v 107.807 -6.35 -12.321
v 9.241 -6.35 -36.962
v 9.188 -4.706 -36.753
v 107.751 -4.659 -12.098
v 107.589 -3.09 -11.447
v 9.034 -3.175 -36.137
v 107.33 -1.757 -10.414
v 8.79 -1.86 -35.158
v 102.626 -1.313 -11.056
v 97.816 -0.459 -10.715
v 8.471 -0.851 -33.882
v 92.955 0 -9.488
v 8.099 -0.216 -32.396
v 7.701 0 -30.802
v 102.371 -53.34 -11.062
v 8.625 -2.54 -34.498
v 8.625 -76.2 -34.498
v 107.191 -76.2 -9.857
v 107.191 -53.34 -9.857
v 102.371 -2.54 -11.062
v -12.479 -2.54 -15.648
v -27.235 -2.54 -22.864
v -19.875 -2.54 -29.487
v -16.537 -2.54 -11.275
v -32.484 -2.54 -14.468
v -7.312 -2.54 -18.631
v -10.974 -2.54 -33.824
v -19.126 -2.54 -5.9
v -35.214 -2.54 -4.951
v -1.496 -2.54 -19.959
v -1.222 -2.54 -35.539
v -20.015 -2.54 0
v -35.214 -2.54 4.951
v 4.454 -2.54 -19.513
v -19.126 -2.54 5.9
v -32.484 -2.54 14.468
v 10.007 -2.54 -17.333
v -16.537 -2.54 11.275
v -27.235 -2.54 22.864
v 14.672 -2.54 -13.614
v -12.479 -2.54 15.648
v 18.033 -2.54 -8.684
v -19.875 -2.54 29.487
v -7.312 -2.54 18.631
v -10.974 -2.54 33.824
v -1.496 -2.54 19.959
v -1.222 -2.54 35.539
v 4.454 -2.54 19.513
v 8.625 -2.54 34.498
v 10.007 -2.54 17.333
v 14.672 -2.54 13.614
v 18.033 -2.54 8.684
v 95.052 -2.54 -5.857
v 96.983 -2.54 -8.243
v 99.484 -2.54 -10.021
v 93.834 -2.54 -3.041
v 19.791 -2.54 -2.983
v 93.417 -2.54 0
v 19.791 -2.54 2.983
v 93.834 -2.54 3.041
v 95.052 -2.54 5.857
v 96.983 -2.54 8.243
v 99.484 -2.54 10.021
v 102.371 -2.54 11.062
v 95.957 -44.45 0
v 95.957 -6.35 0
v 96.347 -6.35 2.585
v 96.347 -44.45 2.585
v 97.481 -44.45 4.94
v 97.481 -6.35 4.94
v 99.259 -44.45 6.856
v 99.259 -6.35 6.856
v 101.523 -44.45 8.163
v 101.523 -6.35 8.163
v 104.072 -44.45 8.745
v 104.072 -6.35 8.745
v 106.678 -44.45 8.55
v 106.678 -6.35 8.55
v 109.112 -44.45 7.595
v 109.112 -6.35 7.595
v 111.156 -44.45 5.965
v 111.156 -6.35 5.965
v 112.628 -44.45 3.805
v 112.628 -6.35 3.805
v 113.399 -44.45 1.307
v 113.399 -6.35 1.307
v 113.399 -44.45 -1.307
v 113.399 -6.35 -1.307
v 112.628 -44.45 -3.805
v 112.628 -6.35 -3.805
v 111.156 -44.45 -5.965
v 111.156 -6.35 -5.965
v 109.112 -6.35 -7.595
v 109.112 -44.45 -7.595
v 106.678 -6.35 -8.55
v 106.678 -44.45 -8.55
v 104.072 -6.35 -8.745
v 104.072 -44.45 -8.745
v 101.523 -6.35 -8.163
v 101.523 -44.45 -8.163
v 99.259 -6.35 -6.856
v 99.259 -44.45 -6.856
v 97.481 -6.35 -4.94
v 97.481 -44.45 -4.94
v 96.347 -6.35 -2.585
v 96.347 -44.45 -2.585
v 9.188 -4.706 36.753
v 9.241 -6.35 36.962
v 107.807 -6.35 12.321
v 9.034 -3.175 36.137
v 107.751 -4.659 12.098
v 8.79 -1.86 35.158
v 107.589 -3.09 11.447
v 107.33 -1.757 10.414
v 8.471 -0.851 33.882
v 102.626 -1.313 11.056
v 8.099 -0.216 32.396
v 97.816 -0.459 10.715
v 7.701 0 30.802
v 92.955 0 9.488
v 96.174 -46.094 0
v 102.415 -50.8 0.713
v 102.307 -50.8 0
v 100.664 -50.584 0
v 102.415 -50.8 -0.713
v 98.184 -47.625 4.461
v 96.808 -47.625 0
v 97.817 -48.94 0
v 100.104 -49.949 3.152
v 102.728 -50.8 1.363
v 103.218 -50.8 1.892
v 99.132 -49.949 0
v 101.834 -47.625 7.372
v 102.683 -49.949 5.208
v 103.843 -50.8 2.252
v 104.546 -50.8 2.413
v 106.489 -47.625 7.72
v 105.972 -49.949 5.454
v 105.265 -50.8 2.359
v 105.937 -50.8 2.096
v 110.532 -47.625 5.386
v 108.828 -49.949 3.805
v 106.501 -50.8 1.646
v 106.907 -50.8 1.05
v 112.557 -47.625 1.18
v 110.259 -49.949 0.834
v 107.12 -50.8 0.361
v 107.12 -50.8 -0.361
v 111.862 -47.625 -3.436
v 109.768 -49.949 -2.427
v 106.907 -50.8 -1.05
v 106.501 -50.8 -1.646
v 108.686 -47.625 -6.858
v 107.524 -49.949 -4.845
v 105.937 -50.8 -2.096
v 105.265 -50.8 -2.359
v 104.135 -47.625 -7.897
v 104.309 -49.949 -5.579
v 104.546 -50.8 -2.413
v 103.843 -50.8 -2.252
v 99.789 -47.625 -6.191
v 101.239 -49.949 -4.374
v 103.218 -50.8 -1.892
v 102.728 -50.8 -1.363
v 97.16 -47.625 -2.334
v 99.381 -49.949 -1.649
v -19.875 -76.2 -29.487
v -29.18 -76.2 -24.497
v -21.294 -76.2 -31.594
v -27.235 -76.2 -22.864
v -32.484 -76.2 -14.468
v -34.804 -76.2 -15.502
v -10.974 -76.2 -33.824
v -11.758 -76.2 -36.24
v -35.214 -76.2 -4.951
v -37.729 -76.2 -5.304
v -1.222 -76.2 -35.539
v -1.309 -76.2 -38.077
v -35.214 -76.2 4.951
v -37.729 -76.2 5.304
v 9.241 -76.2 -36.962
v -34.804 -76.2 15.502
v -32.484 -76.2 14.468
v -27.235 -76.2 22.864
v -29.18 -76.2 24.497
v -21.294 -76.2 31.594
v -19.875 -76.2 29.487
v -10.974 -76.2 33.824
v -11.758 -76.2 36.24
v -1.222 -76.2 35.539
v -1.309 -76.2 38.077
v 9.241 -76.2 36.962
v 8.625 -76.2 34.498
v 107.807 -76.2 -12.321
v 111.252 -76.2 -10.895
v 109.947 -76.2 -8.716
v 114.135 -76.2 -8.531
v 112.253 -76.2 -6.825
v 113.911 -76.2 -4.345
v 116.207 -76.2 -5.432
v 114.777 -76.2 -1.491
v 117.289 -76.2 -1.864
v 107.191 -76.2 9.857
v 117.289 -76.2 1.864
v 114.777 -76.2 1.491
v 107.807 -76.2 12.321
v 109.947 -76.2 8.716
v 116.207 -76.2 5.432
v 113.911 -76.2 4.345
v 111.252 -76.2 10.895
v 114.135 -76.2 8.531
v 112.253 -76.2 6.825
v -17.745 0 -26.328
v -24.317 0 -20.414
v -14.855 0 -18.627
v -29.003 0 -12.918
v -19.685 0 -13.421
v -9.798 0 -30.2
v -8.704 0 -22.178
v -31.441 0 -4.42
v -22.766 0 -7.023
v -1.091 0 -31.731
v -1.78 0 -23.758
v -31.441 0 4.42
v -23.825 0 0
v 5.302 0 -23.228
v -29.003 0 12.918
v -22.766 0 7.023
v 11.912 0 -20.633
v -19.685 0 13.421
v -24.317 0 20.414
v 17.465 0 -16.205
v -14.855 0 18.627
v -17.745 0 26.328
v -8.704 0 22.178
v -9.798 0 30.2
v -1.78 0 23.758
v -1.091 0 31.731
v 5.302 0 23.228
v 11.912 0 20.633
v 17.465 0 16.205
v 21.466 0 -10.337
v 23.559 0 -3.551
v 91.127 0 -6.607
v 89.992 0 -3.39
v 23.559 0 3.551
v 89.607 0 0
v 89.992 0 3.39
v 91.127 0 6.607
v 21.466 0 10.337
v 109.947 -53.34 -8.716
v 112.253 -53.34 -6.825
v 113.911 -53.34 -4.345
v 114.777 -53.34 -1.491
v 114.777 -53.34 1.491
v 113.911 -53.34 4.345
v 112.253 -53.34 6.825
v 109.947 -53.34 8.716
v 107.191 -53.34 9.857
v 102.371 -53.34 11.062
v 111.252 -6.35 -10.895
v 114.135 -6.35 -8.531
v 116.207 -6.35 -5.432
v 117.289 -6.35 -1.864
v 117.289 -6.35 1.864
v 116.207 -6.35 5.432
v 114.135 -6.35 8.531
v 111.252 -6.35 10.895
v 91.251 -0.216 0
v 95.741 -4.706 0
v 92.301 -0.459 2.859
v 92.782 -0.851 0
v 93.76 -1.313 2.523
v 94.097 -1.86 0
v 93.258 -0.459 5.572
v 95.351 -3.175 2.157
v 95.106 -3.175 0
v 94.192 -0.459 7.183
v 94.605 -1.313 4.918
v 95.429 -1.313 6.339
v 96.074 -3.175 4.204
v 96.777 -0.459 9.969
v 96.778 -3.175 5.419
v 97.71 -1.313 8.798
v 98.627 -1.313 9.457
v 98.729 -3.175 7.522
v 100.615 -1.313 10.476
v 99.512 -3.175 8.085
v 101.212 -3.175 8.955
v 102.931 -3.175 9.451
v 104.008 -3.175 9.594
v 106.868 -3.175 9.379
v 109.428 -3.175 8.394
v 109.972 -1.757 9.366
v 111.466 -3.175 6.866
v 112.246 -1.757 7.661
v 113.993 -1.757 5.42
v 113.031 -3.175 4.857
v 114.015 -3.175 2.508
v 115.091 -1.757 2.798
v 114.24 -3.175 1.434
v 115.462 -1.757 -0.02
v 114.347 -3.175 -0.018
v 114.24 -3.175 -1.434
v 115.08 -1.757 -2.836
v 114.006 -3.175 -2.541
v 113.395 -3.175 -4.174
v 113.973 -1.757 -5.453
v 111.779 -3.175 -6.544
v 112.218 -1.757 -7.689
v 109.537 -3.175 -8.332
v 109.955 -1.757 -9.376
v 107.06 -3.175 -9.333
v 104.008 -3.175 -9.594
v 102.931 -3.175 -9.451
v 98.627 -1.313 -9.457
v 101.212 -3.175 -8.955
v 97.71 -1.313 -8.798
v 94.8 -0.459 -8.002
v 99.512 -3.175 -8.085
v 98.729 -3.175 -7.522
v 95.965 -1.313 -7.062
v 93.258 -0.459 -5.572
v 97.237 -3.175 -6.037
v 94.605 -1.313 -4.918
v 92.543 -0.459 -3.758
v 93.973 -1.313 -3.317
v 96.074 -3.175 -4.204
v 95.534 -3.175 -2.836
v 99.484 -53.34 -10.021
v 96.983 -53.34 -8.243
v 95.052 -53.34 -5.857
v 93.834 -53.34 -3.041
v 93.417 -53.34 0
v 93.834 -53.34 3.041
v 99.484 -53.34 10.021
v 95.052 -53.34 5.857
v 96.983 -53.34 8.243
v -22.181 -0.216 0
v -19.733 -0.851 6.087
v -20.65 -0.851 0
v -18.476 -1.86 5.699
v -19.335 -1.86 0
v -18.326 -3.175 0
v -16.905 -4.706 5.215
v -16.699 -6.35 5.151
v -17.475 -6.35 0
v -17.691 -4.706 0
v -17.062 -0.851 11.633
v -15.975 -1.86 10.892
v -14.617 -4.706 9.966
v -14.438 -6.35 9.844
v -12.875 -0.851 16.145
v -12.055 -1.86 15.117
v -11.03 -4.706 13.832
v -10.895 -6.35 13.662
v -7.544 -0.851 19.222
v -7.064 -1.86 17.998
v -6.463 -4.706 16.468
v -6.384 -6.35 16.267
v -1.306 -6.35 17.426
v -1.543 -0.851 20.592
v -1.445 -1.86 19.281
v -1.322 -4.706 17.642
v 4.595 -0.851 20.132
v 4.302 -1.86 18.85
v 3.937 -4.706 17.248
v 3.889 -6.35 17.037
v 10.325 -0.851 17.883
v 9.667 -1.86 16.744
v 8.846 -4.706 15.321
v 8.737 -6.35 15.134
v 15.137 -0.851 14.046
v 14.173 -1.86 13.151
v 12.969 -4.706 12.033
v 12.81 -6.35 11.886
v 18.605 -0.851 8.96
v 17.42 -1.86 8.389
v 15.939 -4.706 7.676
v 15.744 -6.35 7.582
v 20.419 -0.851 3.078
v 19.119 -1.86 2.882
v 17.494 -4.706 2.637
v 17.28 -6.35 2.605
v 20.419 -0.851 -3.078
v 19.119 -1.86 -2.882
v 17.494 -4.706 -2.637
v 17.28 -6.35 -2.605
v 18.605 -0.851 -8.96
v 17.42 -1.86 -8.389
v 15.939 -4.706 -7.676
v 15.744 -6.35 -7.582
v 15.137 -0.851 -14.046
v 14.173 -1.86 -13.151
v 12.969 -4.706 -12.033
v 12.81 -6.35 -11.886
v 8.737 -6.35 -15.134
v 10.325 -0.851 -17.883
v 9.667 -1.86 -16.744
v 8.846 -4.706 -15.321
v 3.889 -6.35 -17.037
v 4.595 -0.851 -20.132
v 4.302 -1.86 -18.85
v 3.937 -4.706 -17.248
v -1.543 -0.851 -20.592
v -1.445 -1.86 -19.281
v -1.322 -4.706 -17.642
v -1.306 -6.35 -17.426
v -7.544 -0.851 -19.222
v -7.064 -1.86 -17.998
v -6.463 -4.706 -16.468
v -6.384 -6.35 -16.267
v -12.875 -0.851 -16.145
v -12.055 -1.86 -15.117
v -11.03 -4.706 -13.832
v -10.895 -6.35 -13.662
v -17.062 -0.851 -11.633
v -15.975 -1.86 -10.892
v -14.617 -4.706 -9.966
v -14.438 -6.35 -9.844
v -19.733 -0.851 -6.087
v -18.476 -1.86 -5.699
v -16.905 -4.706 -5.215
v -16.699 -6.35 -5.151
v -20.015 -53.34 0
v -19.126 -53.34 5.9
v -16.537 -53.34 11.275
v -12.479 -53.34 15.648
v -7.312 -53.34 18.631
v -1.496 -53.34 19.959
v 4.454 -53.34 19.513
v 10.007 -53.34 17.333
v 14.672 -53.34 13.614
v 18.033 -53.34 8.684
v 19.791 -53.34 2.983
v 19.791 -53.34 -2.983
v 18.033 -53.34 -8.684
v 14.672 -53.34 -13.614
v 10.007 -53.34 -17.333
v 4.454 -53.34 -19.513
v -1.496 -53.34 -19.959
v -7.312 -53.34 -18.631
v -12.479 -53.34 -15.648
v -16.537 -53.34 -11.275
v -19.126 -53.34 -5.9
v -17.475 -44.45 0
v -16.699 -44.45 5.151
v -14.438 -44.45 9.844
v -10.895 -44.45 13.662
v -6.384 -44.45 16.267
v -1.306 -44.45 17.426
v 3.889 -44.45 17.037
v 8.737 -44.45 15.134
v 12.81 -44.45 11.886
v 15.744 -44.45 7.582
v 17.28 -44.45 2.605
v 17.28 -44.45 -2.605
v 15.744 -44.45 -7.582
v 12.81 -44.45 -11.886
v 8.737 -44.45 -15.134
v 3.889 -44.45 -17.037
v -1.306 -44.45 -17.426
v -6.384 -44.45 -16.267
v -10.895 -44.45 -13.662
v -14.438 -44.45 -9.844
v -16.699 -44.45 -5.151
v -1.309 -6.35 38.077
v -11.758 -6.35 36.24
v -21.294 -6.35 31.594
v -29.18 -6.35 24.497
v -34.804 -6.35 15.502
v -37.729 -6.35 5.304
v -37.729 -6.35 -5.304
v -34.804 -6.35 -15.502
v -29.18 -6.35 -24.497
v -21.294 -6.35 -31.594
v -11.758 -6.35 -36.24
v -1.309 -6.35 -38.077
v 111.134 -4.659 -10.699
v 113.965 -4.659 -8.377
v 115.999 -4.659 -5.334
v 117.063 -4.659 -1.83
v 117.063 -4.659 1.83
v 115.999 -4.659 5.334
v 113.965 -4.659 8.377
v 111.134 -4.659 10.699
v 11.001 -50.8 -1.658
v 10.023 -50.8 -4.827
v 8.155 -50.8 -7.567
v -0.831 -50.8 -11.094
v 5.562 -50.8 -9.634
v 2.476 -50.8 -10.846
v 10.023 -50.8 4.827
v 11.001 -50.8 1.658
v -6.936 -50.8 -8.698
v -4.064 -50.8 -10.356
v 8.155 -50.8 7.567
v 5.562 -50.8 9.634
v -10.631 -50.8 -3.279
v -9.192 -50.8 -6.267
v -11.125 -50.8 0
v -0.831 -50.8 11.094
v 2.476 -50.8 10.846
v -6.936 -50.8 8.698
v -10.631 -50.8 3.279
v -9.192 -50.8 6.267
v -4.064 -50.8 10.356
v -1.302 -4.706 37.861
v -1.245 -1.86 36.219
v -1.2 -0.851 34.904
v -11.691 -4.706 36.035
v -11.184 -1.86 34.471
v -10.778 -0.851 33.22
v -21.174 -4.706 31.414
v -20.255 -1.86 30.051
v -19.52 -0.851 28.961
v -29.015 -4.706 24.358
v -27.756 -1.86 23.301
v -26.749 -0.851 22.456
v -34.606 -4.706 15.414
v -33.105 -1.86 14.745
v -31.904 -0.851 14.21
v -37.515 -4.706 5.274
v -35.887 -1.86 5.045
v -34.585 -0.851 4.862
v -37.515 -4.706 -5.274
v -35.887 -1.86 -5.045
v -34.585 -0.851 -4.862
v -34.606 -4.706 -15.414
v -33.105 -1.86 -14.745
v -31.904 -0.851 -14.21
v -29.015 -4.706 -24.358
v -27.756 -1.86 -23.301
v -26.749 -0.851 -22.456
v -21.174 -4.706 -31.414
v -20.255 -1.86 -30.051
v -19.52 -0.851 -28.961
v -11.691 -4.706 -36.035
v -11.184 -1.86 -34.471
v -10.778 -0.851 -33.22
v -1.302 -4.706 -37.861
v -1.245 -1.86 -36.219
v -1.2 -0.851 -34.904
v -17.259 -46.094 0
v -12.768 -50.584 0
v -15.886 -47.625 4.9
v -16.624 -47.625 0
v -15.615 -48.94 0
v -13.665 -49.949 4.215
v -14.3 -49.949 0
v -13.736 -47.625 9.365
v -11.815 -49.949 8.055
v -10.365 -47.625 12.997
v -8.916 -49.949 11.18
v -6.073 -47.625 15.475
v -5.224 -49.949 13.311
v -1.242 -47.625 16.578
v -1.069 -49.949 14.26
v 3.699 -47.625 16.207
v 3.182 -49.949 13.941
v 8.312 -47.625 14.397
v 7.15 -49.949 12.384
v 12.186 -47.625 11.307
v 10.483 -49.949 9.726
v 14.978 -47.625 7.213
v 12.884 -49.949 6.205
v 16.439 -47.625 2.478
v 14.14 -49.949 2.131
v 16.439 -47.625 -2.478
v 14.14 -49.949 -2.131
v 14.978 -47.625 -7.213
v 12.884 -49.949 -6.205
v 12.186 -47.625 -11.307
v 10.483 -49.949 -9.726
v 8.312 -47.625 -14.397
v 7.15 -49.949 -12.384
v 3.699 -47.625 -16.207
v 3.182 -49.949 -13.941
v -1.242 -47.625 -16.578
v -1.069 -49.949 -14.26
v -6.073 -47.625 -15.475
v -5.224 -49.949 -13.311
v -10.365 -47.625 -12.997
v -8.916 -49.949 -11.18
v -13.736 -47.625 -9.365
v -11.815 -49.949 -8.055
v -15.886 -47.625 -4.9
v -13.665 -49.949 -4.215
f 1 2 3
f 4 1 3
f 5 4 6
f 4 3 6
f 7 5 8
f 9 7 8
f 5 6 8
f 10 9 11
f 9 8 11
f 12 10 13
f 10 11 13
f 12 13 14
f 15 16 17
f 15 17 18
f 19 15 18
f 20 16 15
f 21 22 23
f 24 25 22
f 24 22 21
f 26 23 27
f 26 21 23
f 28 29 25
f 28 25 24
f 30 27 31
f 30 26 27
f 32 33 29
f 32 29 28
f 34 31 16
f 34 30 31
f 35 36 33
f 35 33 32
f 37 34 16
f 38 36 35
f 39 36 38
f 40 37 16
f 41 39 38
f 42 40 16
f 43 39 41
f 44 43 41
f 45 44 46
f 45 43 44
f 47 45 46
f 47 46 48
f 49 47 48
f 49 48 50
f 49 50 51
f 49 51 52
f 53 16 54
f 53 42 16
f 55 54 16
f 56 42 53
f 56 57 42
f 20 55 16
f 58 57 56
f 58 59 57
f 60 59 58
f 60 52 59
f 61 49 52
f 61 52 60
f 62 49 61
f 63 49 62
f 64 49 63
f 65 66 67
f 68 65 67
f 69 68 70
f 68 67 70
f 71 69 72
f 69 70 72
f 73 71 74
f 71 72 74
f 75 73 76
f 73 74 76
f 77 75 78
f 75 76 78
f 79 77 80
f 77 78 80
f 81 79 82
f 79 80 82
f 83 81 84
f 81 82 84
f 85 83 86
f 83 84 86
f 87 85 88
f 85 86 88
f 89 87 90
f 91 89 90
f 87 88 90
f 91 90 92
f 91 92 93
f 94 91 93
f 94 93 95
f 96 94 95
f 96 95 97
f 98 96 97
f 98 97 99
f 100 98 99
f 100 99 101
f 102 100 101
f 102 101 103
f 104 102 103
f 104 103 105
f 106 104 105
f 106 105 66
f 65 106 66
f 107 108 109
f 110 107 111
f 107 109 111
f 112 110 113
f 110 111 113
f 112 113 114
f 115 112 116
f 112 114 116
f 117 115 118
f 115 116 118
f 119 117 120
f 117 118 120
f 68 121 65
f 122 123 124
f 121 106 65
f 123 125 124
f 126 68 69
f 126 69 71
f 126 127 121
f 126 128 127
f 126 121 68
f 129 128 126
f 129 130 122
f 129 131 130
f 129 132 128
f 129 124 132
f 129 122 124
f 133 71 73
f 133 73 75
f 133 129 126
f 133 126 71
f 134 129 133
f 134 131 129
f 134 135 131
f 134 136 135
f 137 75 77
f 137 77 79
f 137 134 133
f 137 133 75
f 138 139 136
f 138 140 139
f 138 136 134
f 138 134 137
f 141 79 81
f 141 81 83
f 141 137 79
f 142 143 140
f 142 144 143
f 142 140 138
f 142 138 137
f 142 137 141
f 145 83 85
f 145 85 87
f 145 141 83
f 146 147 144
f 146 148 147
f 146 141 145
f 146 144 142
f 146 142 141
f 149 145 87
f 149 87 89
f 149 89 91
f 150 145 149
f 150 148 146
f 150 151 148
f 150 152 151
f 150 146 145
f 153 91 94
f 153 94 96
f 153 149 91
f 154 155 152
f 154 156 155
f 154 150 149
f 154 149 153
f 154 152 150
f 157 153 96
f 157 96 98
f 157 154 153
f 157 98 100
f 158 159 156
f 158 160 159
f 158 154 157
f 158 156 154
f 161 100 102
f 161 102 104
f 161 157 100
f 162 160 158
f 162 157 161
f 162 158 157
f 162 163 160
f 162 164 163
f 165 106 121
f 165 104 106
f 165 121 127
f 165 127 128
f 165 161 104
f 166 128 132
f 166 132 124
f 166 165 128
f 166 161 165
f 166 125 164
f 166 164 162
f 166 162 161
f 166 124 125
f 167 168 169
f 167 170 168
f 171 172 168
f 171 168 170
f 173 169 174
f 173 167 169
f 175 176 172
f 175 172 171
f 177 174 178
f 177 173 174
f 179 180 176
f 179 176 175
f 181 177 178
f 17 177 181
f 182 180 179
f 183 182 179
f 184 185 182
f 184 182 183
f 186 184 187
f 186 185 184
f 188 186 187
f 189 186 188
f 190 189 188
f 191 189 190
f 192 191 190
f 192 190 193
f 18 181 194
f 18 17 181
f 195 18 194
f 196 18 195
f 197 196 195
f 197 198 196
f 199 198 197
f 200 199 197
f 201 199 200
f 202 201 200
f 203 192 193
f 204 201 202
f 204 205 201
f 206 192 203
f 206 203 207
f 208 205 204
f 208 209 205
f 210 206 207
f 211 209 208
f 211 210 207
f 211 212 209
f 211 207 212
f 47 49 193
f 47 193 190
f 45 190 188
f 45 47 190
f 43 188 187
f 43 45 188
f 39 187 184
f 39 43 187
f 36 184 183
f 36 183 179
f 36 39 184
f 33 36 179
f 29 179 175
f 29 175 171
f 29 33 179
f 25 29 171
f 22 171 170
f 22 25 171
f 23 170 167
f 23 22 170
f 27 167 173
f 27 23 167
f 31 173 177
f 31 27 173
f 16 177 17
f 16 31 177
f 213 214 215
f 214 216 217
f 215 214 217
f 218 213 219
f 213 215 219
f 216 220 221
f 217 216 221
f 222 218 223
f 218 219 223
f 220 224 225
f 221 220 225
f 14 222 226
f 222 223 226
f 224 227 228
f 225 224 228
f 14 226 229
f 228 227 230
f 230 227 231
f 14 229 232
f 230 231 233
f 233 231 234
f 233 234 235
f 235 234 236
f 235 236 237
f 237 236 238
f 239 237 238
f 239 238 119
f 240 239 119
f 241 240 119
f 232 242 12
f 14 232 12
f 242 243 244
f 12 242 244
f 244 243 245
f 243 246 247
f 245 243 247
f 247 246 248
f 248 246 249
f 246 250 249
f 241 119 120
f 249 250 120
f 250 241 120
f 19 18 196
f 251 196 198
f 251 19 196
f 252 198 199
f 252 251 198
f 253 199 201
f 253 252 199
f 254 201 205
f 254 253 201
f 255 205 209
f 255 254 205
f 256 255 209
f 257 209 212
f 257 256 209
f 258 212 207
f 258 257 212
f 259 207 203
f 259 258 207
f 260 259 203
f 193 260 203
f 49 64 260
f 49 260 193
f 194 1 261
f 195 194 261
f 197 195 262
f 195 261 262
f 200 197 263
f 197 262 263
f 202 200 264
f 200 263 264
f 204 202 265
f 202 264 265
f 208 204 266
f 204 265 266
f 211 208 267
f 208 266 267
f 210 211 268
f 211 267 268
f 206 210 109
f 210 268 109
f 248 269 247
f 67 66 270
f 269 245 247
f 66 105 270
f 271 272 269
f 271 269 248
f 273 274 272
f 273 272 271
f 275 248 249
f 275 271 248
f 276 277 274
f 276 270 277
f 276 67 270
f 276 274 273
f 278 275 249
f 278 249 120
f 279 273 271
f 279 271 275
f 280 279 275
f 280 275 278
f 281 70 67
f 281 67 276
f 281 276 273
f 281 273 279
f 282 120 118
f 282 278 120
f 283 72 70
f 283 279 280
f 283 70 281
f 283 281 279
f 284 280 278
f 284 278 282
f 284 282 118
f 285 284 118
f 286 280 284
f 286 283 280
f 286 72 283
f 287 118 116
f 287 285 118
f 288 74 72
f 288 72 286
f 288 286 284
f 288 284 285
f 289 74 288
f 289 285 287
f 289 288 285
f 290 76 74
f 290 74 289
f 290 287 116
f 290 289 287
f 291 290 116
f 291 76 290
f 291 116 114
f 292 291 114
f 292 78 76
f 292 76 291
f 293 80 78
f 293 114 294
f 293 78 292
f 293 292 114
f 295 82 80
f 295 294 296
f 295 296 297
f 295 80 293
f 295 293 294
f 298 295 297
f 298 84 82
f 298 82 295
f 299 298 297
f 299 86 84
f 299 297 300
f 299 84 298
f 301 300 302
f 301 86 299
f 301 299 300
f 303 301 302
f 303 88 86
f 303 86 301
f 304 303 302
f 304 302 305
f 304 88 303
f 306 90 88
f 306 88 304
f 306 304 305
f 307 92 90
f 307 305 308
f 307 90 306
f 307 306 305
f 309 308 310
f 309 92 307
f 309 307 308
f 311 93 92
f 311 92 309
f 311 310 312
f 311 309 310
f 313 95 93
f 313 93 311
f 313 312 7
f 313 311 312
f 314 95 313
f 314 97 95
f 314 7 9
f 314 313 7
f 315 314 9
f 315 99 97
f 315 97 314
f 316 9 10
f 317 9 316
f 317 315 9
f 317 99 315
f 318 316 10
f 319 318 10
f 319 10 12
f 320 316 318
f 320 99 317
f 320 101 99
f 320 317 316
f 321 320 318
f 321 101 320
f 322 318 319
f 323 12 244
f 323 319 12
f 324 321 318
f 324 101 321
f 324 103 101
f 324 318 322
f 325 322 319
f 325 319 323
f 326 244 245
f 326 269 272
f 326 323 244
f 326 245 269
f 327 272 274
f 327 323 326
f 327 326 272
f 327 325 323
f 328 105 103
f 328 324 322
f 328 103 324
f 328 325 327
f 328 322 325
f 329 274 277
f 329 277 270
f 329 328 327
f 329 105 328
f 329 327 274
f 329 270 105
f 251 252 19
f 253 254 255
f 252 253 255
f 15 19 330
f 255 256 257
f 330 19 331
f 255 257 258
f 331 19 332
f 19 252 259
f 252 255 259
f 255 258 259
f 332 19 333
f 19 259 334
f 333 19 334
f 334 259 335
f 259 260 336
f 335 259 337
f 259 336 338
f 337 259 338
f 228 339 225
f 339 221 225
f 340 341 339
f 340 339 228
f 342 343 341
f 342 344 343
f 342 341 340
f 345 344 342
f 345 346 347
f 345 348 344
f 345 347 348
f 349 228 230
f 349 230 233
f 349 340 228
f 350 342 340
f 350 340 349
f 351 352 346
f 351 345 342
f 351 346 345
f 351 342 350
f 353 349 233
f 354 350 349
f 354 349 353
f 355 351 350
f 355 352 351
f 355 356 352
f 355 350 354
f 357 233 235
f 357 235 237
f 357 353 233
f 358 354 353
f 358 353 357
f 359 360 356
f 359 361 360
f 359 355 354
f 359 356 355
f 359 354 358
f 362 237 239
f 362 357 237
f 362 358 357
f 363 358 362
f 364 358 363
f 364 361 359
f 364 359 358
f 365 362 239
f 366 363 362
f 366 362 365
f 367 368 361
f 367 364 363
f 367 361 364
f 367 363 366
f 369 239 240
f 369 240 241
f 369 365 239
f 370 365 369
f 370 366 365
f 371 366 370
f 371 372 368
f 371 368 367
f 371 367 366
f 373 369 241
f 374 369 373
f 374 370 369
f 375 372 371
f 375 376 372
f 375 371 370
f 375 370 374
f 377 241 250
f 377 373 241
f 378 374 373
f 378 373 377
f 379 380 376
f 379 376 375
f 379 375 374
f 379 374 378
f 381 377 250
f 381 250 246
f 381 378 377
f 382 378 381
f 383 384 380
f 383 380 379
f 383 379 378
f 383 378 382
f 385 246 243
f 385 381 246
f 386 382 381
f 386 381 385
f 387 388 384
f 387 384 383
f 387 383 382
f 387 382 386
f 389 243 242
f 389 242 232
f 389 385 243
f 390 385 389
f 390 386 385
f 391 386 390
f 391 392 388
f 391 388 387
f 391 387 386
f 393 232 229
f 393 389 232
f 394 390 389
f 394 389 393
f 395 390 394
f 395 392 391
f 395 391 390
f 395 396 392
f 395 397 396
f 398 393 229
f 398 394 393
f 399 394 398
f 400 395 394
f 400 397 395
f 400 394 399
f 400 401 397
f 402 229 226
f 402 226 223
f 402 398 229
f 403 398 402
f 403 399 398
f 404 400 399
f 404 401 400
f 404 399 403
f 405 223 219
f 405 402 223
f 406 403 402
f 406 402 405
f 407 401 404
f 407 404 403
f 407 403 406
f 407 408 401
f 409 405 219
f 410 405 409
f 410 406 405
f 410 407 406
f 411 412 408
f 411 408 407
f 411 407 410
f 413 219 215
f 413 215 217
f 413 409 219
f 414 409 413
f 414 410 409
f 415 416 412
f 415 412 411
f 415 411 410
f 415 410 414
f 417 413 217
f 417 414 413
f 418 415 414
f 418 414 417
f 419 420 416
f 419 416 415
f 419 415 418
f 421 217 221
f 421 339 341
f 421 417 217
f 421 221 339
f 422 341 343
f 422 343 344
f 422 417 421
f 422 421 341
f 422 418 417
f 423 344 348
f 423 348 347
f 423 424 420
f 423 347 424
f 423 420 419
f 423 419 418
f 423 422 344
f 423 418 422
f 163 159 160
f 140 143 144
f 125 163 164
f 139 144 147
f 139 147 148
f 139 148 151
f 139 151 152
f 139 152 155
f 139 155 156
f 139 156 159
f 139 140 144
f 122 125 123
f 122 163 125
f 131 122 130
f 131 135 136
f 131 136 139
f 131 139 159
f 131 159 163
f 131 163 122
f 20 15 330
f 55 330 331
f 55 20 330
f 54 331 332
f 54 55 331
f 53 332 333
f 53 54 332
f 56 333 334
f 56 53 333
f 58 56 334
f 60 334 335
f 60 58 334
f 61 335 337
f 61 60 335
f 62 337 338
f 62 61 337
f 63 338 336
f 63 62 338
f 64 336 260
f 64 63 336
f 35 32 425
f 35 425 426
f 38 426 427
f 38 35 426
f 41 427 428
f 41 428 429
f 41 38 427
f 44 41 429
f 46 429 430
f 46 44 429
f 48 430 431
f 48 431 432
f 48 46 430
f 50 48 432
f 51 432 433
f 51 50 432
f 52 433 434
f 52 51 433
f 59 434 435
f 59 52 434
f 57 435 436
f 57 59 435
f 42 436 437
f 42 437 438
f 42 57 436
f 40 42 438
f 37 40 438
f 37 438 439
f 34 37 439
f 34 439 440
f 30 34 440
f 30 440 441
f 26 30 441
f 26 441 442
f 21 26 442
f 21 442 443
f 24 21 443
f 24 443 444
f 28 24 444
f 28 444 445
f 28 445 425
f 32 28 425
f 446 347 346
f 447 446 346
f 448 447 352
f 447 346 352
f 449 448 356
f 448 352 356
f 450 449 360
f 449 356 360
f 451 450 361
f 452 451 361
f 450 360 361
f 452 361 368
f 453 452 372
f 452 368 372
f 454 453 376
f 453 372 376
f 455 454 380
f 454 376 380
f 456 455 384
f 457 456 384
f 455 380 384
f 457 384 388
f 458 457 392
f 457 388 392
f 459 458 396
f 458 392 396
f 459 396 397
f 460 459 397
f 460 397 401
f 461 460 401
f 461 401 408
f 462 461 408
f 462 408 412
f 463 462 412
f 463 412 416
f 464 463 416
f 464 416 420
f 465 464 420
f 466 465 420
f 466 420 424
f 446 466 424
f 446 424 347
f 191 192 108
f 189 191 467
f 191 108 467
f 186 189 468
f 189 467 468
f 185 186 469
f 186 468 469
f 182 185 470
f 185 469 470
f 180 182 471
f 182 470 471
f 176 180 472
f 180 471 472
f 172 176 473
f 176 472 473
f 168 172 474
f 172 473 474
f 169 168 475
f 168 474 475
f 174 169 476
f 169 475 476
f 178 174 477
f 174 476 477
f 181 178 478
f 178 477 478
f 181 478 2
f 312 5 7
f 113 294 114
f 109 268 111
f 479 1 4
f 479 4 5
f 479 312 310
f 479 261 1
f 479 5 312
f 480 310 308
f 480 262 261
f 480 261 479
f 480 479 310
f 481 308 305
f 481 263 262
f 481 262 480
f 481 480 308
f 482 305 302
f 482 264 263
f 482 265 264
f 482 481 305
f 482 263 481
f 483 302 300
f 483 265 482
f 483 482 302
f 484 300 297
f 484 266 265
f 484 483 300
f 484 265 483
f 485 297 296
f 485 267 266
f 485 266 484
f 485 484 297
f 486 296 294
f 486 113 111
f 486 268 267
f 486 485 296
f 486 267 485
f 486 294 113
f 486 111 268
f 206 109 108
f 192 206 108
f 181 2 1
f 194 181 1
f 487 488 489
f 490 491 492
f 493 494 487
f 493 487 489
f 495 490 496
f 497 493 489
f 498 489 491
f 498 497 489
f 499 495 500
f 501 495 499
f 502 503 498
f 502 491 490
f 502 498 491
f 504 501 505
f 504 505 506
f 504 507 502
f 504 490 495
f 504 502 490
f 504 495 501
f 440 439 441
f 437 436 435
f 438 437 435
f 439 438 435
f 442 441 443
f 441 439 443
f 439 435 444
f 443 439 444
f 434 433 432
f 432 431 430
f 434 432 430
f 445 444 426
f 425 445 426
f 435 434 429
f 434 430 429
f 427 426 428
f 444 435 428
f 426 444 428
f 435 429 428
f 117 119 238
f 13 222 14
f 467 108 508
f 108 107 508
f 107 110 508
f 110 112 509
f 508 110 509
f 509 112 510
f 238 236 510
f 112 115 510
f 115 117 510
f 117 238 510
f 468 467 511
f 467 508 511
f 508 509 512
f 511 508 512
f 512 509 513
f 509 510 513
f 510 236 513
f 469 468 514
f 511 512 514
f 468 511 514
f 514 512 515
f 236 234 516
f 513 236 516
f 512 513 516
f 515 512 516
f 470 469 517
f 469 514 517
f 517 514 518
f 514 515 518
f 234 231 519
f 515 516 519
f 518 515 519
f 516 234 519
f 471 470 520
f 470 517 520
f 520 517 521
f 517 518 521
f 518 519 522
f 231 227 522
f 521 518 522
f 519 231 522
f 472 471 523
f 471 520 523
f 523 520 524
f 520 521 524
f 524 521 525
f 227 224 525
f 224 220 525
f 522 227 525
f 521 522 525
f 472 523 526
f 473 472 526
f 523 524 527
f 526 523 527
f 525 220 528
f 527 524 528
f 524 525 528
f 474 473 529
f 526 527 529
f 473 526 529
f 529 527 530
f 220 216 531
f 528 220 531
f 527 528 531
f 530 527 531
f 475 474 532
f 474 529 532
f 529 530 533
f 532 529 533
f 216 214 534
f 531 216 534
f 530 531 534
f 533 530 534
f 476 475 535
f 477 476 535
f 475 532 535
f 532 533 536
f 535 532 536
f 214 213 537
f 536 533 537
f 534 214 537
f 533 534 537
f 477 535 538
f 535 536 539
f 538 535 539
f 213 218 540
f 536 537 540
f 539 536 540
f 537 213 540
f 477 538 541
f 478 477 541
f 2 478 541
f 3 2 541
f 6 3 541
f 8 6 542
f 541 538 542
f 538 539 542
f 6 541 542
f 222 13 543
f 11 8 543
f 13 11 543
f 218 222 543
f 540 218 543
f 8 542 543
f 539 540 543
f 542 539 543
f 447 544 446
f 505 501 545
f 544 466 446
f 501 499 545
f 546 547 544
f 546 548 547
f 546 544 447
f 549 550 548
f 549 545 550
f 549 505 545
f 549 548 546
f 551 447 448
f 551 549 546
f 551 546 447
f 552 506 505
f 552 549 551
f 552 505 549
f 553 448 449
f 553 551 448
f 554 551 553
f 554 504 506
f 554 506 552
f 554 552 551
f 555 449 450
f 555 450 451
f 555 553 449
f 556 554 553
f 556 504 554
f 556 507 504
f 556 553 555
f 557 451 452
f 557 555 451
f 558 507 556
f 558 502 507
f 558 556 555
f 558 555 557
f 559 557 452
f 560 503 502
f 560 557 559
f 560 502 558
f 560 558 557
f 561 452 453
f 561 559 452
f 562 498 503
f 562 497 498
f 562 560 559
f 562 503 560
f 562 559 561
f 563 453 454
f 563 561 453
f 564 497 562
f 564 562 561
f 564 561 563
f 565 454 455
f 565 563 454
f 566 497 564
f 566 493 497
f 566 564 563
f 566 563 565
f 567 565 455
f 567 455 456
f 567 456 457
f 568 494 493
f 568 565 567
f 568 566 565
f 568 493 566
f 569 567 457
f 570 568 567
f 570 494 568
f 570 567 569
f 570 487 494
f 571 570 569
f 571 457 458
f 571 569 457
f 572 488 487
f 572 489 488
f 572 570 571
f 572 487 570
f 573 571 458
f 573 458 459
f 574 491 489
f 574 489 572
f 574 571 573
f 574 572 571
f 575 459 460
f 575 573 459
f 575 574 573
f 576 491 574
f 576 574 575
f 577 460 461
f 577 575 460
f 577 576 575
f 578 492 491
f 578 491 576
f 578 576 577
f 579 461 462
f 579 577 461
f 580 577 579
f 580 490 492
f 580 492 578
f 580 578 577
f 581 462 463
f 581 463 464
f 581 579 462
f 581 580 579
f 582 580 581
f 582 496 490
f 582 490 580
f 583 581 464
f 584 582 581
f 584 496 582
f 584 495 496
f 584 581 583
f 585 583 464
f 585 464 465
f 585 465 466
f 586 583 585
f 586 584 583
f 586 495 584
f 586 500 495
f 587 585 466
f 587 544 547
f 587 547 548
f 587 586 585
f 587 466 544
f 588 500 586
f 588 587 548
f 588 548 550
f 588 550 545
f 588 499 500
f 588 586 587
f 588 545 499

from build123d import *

# Parameters (mm, degrees)
F1_DEPTH     = 76.2
F2_R         = 17.4749230477
F2_R_2       = 8.76970131
F3_DEPTH     = 50.8
F4_T         = 2.54
F5_T5_DEPTH  = 101.6
F5_T7_DEPTH  = 101.6
F5_T14_ANGLE = 151.9275130641
F5_T16_ANGLE = 208.0724869359


# Not quite as in the source:
# - a fillet or chamfer that OpenCascade refuses, or shapes differently, is made with other operations: its cross-section is extruded or revolved along the edge and cut away or added
# - a shell that OpenCascade refuses in one call is made with other operations: the cavity is built on its own and cut out


with BuildPart() as f1:
    # F0 (on Front) → F1 (new body)
    with BuildSketch(Plane.XZ):
        with BuildLine():
            ThreePointArc((9.2406073139, -36.9624292555), (30.0306271884, -23.4472051782), (38.1, 0))
            ThreePointArc((38.1, 0), (30.0306271884, 23.4472051782), (9.2406073139, 36.9624292555))
            ThreePointArc((9.2406073139, 36.9624292555), (-38.1, 0), (9.2406073139, -36.9624292555))
        make_face()
        with BuildLine():
            ThreePointArc((9.2406073139, 36.9624292555), (30.0306271884, 23.4472051782), (38.1, 0))
            ThreePointArc((38.1, 0), (30.0306271884, -23.4472051782), (9.2406073139, -36.9624292555))
            Line((9.2406073139, -36.9624292555), (107.8070853287, -12.3208097518))
            ThreePointArc((107.8070853287, -12.3208097518), (92.0268828907, 0), (107.8070853287, 12.3208097518))
            Line((107.8070853287, 12.3208097518), (9.2406073139, 36.9624292555))
        make_face()
        with BuildLine():
            ThreePointArc((117.4268828907, 0), (114.7370919535, 7.8157350594), (107.8070853287, 12.3208097518))
            ThreePointArc((107.8070853287, 12.3208097518), (92.0268828907, 0), (107.8070853287, -12.3208097518))
            ThreePointArc((107.8070853287, -12.3208097518), (114.7370919535, -7.8157350594), (117.4268828907, 0))
        make_face()
    extrude(amount=F1_DEPTH)

    # F2 (on face) → F3 (cut)
    with BuildSketch(Plane(origin=(0, 0, 0), x_dir=(-1, 0, 0), z_dir=(0, 1, 0))):
        Circle(F2_R)
        with Locations((-104.7268828907, 0)):
            Circle(F2_R_2)
    extrude(amount=-F3_DEPTH, mode=Mode.SUBTRACT)

    # F4: shell of thickness 2.54, made by hand


with BuildPart() as f4_core1:
    # F4_t2: copy of F1
    add(f1.part)

    # the walls: a layer under each face that stays
    f4_faces = [f4_core1.faces().sort_by_distance(p)[0] for p in [
        (-38.1, -38.1, 0),
        (58.5238463213, -38.1, 24.6416195037),
        (58.5238463213, -38.1, -24.6416195037),
        (39.6634414453, 0, 0),
        (117.4268828907, -38.1, 0),
        (113.4965842007, -25.4, 0),
        (17.4749230477, -25.4, 0),
        (104.7268828907, -50.8, 0),
        (0, -50.8, 0),
    ]]
    thicken(f4_faces, amount=-F4_T, mode=Mode.SUBTRACT)

    # F4_s3 → F4_t4 (revolve, cut)
    with BuildSketch(Plane.XY):
        Polygon((95.9825815807, -50.7746), (93.4171815807, -50.8), (93.4171815807, -53.34), (95.9571815807, -53.34), align=None)
    revolve(axis=Axis((104.7268828907, -50.8, 0), (0, 1, 0)), mode=Mode.SUBTRACT)

    # F4_s5 → F4_t6 (revolve, cut)
    with BuildSketch(Plane.XY):
        Polygon((-17.4495230477, -50.7746), (-20.0149230477, -50.8), (-20.0149230477, -53.34), (-17.4749230477, -53.34), align=None)
    revolve(axis=Axis((0, -50.8, 0), (0, 1, 0)), mode=Mode.SUBTRACT)


with BuildPart() as f1_1:
    add(f1.part)

    # what is left inside the walls is the cavity
    f4_cavity = [f4_core1.part.solids().sort_by_distance(p)[0] for p in [
        (-35.5346, -51.646667, 0),
    ]]
    add(f4_cavity, mode=Mode.SUBTRACT)

    # F5: fillet of radius 6.35 on 5 edges, made by hand

    # F5_s1 → F5_t2 (revolve)
    with BuildSketch(Plane.XY):
        with BuildLine():
            ThreePointArc((95.9571815807, -44.45), (97.8170535202, -48.9401280605), (102.3071815807, -50.8))
            Line((102.3071815807, -50.8), (95.9571815807, -50.8))
            Line((95.9571815807, -50.8), (95.9571815807, -44.45))
        make_face()
    revolve(axis=Axis((104.7268828907, -50.8, 0), (0, 1, 0)))

    # F5_s3 → F5_t4 (revolve)
    with BuildSketch(Plane.XY):
        with BuildLine():
            ThreePointArc((-17.4749230477, -44.45), (-15.6150511082, -48.9401280605), (-11.1249230477, -50.8))
            Line((-11.1249230477, -50.8), (-17.4749230477, -50.8))
            Line((-17.4749230477, -50.8), (-17.4749230477, -44.45))
        make_face()
    revolve(axis=Axis((0, -50.8, 0), (0, 1, 0)))

    # F5_s6 → F5_t5 (cut)
    with BuildSketch(Plane(origin=(98.5664780148, 0, -24.6416195037), x_dir=(0, 1, 0), z_dir=(-0.9701425001, 0, 0.242535625))):
        with BuildLine():
            ThreePointArc((-6.35, -38.1), (-1.8598719395, -36.2401280605), (0, -31.75))
            Line((0, -31.75), (0, -38.1))
            Line((0, -38.1), (-6.35, -38.1))
        make_face()
    extrude(amount=F5_T5_DEPTH, mode=Mode.SUBTRACT)

    # F5_s8 → F5_t7 (cut)
    with BuildSketch(Plane(origin=(0, 0, 0), x_dir=(0, 1, 0), z_dir=(0.9701425001, 0, 0.242535625))):
        with BuildLine():
            ThreePointArc((-6.35, -38.1), (-1.8598719395, -36.2401280605), (0, -31.75))
            Line((0, -31.75), (0, -38.1))
            Line((0, -38.1), (-6.35, -38.1))
        make_face()
    extrude(amount=F5_T7_DEPTH, mode=Mode.SUBTRACT)

    # F5_s9 → F5_t10 (revolve, cut)
    with BuildSketch(Plane.XY):
        with BuildLine():
            ThreePointArc((89.6071815807, 0), (94.0973096412, -1.8598719395), (95.9571815807, -6.35))
            Line((95.9571815807, -6.35), (95.9571815807, 0))
            Line((95.9571815807, 0), (89.6071815807, 0))
        make_face()
    revolve(axis=Axis((104.7268828907, 0, 0), (0, 1, 0)), mode=Mode.SUBTRACT)

    # F5_s11 → F5_t12 (revolve, cut)
    with BuildSketch(Plane.XY):
        with BuildLine():
            ThreePointArc((-23.8249230477, 0), (-19.3347949872, -1.8598719395), (-17.4749230477, -6.35))
            Line((-17.4749230477, -6.35), (-17.4749230477, 0))
            Line((-17.4749230477, 0), (-23.8249230477, 0))
        make_face()
    revolve(axis=Axis((0, 0, 0), (0, 1, 0)), mode=Mode.SUBTRACT)

    # F5_s13 → F5_t14 (revolve, cut)
    with BuildSketch(Plane(origin=(98.5664780148, 0, 24.6416195037), x_dir=(0, 1, 0), z_dir=(-0.9701425001, 0, -0.242535625))):
        with BuildLine():
            ThreePointArc((0, 31.75), (-1.8598719395, 36.2401280605), (-6.35, 38.1))
            Line((-6.35, 38.1), (0, 38.1))
            Line((0, 38.1), (0, 31.75))
        make_face()
    revolve(axis=Axis((104.7268828907, 0, 0), (0, -1, 0)), revolution_arc=F5_T14_ANGLE, mode=Mode.SUBTRACT)

    # F5_s15 → F5_t16 (revolve, cut)
    with BuildSketch(Plane(origin=(0, 0, 0), x_dir=(0, 1, 0), z_dir=(0.9701425001, 0, -0.242535625))):
        with BuildLine():
            ThreePointArc((-6.35, 38.1), (-1.8598719395, 36.2401280605), (0, 31.75))
            Line((0, 31.75), (0, 38.1))
            Line((0, 38.1), (-6.35, 38.1))
        make_face()
    revolve(axis=Axis((0, 0, 0), (0, -1, 0)), revolution_arc=F5_T16_ANGLE, mode=Mode.SUBTRACT)


solid = f1_1.part
